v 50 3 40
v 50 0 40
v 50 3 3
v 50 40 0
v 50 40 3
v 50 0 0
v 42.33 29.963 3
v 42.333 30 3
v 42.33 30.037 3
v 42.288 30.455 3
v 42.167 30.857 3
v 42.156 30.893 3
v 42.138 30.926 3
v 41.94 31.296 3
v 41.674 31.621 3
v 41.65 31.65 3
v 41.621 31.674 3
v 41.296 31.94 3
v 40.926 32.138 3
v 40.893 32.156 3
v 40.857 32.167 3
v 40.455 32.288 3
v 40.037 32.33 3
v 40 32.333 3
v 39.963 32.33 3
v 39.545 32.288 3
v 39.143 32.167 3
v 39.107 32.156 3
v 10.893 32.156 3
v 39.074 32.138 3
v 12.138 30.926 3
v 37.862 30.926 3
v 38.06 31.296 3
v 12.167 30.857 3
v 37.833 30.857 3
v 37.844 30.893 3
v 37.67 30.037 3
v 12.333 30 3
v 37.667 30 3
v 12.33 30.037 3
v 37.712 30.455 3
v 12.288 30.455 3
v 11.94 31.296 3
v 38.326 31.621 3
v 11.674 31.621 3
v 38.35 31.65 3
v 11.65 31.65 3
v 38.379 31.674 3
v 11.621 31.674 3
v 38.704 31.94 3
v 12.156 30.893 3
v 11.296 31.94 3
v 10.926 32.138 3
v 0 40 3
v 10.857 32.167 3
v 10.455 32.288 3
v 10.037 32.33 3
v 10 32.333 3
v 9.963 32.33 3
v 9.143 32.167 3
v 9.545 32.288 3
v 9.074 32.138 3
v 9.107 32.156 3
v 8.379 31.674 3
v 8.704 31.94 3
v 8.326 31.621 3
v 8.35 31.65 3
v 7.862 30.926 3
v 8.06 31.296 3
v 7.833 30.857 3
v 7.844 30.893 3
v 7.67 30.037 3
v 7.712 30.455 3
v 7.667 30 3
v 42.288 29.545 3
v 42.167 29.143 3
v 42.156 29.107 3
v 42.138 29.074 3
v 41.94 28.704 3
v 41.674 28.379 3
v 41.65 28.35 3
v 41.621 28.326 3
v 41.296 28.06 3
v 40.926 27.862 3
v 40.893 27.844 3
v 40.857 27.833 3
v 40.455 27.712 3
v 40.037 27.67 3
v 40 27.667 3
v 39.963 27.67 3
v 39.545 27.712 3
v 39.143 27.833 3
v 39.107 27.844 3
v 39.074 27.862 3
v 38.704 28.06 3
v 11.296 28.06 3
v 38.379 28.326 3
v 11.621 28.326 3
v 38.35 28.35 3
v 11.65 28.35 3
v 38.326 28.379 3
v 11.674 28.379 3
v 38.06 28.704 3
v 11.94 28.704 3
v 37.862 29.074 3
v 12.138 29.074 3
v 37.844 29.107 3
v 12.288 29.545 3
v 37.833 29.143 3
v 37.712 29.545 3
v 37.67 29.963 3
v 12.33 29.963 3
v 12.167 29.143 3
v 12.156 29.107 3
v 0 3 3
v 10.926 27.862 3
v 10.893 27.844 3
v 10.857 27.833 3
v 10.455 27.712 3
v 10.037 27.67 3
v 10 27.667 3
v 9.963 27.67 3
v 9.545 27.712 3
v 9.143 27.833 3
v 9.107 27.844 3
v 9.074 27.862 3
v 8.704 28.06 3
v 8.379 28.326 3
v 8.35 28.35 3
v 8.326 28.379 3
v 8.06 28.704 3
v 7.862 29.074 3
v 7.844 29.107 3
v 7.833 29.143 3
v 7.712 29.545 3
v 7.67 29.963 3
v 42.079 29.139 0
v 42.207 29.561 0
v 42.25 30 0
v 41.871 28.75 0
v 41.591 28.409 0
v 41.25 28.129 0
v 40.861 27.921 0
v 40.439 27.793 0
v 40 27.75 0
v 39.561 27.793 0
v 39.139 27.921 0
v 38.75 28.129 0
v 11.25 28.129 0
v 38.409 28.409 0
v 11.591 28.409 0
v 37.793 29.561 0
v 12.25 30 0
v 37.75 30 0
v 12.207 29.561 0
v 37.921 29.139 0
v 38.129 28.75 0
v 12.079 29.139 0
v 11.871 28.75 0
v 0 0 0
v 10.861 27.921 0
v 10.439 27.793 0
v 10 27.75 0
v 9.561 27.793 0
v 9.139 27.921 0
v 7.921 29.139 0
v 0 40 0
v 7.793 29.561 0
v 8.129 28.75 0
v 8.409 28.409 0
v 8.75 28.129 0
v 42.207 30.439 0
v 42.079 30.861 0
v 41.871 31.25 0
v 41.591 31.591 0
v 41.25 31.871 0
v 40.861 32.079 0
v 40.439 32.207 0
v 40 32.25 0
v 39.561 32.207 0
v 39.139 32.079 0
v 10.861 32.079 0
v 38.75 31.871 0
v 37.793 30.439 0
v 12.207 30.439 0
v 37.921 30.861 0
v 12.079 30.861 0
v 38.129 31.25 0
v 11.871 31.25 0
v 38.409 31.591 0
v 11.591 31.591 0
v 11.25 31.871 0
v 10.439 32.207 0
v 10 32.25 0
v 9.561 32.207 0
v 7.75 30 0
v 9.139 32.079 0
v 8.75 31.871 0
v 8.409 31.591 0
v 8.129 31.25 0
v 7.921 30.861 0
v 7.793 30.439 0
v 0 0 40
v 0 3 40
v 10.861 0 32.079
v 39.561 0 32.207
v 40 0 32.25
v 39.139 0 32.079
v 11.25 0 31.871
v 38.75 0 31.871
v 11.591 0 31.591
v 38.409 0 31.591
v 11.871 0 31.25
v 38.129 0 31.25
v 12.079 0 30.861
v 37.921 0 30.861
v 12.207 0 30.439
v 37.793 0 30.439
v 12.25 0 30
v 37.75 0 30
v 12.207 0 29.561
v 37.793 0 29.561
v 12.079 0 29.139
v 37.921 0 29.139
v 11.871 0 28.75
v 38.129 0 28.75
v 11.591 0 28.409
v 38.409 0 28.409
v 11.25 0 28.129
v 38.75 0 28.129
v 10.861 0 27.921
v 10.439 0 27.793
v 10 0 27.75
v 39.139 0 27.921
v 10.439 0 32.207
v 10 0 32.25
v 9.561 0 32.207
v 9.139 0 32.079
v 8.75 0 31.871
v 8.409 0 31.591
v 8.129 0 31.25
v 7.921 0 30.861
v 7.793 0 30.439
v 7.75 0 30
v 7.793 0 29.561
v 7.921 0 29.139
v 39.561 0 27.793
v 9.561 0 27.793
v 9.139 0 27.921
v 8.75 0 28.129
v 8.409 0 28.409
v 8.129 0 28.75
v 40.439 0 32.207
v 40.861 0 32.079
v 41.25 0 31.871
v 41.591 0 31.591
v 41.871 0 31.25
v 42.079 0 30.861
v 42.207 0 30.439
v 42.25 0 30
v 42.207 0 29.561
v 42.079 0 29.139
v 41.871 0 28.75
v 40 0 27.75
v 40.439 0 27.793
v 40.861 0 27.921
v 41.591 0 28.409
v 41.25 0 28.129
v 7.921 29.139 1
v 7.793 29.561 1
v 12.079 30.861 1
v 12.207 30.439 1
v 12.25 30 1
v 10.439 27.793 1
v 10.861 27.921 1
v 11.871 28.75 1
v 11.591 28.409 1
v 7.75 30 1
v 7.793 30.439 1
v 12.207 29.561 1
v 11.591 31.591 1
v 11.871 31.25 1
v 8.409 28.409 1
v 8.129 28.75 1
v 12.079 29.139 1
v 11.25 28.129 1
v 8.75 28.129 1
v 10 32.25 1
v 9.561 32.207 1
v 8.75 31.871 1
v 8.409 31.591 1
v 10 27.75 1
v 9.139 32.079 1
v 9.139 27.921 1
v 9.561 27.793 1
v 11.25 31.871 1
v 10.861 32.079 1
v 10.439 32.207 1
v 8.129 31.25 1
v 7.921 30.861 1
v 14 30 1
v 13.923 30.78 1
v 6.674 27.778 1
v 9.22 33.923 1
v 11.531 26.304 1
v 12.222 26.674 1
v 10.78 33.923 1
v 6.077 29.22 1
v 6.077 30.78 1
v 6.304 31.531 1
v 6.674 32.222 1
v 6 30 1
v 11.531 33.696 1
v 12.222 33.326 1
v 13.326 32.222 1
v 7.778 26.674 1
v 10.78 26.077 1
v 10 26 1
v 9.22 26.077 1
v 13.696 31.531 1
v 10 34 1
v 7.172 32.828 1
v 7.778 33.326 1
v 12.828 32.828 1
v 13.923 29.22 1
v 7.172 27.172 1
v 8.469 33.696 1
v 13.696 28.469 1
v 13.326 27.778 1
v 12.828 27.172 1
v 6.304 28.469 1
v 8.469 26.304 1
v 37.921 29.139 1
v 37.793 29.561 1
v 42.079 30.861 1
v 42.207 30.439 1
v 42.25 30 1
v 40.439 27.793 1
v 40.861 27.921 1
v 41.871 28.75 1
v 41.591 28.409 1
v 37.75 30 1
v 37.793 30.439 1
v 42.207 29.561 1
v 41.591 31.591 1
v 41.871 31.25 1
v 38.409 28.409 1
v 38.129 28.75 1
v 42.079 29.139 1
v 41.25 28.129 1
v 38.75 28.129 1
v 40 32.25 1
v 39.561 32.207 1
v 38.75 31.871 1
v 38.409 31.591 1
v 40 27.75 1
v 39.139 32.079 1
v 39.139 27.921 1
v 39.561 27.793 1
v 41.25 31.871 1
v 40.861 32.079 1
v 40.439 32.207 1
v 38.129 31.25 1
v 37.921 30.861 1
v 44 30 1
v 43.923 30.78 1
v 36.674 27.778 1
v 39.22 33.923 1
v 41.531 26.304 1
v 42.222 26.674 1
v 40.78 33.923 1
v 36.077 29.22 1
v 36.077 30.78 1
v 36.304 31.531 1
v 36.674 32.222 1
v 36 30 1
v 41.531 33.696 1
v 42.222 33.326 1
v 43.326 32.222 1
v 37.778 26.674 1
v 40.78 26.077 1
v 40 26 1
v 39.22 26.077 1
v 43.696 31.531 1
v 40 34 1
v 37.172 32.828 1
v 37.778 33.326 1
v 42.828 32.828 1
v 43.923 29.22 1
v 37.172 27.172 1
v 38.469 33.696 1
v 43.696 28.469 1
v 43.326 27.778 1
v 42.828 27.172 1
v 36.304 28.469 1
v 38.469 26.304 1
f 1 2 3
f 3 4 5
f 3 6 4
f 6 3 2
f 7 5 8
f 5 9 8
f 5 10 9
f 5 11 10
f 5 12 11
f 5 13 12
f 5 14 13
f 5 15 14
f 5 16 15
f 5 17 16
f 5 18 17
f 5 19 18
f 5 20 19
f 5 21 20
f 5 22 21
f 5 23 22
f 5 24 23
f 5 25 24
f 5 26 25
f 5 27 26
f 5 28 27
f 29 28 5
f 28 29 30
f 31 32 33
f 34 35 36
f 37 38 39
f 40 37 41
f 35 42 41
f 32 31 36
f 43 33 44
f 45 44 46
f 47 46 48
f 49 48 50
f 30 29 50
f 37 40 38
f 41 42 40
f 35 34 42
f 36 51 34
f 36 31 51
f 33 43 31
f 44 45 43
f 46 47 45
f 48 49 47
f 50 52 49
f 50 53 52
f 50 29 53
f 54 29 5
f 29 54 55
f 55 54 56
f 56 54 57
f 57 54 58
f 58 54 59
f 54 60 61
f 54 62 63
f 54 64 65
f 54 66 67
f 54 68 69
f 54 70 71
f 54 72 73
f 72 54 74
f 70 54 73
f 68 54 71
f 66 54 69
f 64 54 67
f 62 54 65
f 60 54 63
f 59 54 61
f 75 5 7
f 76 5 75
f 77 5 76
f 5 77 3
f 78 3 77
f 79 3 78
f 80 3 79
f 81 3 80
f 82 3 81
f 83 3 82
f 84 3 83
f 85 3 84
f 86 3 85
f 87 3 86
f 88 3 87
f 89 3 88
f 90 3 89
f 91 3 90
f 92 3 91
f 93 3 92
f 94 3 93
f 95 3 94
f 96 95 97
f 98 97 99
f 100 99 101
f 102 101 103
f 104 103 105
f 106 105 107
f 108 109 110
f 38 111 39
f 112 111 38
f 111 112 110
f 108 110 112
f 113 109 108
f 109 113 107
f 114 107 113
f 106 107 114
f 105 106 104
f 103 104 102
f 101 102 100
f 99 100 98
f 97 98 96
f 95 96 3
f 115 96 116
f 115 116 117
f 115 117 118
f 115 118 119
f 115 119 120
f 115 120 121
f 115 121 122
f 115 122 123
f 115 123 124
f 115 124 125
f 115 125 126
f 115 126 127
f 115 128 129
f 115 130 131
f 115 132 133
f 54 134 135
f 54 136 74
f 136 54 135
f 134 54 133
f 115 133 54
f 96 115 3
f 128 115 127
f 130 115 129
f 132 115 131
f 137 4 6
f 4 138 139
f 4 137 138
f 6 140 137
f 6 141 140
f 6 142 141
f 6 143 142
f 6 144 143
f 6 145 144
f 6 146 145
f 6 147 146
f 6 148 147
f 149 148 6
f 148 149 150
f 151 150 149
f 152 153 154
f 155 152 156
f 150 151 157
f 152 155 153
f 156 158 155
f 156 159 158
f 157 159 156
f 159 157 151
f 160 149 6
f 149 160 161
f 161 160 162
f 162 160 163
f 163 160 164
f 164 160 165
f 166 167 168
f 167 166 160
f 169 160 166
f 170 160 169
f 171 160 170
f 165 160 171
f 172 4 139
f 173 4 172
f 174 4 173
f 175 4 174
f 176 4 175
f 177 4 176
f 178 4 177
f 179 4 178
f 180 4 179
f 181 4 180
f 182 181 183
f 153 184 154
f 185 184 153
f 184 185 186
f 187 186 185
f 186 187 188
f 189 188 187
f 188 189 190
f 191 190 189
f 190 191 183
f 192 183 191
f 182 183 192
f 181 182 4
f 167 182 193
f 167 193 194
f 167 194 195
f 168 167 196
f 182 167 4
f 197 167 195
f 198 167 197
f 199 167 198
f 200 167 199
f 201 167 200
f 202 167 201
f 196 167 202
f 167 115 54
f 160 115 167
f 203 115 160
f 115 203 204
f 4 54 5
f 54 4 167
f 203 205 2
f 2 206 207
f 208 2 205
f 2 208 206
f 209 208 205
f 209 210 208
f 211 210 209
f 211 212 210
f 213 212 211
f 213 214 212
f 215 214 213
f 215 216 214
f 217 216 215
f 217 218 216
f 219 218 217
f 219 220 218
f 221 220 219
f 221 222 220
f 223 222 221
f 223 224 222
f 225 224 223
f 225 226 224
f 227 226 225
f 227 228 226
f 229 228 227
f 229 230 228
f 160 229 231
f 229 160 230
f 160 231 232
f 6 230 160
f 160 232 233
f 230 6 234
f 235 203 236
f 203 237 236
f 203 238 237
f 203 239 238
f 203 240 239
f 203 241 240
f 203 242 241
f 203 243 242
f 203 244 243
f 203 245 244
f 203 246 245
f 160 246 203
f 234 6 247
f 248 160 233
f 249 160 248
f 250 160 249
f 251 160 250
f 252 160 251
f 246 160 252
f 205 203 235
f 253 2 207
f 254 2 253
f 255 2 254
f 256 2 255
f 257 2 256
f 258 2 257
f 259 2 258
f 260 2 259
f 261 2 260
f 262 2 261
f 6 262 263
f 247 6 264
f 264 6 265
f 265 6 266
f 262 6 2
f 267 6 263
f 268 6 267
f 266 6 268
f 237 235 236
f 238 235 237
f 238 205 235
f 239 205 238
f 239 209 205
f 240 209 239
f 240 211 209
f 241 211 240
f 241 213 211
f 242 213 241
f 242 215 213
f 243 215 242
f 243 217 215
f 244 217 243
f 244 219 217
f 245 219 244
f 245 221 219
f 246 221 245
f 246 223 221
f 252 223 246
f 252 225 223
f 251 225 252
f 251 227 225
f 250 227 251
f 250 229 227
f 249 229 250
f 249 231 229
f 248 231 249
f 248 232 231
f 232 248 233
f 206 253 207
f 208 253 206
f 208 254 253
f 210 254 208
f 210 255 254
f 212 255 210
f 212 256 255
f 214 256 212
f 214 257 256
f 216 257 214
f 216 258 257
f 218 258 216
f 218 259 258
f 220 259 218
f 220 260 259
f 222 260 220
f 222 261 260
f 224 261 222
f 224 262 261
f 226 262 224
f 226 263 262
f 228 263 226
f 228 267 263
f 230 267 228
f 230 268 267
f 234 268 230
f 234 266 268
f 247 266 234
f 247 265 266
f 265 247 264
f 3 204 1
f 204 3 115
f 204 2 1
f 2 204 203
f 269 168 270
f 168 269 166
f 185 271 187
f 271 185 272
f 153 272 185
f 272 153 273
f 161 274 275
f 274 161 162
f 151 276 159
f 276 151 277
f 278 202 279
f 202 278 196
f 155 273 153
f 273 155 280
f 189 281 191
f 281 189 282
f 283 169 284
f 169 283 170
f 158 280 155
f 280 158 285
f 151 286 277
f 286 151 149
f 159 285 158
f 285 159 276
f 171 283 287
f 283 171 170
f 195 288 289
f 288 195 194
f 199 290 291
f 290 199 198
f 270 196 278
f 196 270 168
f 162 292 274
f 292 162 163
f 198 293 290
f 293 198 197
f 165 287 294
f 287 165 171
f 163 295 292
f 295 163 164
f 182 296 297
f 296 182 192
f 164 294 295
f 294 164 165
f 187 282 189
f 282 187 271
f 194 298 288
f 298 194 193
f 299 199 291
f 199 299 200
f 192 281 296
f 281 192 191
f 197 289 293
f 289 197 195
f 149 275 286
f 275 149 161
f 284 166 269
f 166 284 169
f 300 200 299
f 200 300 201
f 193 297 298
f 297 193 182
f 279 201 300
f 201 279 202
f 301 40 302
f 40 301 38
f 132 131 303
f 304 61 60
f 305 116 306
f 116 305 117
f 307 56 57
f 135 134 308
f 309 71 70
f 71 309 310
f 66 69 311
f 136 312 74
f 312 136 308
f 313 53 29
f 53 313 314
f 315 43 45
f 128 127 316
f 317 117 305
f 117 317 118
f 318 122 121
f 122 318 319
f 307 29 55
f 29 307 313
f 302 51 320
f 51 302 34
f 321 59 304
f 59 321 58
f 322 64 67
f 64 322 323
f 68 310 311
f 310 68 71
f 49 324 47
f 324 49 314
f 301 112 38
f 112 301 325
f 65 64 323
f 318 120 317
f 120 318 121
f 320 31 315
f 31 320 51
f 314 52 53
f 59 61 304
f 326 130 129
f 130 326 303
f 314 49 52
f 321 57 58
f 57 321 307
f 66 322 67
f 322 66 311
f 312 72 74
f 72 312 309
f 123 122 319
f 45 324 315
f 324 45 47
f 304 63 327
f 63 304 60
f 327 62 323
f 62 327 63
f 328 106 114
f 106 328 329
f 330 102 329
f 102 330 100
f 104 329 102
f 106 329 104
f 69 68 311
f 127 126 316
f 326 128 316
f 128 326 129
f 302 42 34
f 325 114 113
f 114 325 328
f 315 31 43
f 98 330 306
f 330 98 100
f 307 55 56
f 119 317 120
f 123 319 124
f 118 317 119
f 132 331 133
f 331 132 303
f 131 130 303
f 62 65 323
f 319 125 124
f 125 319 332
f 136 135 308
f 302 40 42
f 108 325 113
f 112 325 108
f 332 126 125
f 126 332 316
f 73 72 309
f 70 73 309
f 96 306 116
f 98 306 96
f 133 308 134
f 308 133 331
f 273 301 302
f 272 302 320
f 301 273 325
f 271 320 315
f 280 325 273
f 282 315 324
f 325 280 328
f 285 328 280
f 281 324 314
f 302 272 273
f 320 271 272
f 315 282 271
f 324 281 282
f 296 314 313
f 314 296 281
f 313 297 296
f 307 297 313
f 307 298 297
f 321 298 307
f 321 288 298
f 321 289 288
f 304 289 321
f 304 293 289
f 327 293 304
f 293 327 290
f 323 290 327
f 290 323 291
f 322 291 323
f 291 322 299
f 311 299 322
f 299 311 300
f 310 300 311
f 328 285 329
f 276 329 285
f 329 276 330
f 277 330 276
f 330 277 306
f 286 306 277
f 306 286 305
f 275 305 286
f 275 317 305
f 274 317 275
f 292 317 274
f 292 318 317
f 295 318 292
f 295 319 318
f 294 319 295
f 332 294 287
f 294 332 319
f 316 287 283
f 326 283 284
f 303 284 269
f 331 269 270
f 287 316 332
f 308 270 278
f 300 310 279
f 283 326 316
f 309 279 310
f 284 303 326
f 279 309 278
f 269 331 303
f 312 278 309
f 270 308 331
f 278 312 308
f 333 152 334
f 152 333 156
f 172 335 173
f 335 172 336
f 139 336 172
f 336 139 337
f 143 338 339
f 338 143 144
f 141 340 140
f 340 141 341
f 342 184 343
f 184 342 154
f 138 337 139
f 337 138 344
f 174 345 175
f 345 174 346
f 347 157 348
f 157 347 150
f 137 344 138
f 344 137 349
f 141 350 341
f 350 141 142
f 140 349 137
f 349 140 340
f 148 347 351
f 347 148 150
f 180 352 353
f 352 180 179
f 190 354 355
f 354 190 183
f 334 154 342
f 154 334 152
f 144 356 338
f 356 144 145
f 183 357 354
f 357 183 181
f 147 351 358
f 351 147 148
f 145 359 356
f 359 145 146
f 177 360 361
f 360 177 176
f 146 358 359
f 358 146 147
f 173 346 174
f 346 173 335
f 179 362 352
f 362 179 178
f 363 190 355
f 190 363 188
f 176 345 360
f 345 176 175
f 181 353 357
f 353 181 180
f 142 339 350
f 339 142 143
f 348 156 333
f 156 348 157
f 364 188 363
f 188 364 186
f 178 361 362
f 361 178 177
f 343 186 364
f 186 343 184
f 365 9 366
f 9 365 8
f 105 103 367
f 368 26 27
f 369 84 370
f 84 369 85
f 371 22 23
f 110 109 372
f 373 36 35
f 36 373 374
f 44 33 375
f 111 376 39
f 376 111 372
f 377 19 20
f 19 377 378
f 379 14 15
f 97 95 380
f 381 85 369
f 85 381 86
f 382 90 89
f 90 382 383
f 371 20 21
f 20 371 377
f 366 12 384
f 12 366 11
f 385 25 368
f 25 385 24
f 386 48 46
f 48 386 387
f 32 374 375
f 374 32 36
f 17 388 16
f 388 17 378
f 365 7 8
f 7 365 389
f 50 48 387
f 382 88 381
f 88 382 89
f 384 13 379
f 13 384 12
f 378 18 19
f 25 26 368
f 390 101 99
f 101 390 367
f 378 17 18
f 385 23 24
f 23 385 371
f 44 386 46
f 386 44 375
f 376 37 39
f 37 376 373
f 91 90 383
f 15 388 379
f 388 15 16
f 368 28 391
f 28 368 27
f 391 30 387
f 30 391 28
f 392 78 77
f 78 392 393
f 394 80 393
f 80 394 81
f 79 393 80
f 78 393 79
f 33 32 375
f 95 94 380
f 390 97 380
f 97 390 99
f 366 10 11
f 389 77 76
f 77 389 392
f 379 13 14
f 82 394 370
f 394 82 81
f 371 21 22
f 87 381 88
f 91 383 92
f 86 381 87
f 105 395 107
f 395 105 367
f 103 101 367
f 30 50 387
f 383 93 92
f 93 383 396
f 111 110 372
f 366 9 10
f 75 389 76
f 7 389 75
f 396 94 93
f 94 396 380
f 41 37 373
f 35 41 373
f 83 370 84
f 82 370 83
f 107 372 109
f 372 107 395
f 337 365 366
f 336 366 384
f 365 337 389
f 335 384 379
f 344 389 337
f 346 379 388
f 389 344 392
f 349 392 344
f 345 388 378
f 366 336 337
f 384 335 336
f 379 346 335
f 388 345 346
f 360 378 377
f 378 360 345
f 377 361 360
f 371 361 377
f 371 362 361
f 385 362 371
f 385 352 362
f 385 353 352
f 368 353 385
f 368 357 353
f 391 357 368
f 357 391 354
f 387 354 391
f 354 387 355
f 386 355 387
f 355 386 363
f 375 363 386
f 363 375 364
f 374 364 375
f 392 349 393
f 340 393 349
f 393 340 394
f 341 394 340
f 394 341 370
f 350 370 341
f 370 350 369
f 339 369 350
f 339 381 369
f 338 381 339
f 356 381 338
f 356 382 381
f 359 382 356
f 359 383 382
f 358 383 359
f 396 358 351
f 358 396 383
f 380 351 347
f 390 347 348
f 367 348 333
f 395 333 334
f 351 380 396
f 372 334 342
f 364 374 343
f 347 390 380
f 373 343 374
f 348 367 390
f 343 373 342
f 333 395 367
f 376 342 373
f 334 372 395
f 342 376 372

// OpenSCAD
// L字金具の寸法
flange_width = 50;  // 幅 (X方向)
horizontal_flange_depth = 40; // 水平フランジの奥行き (Y方向)
vertical_flange_height = 40;  // 垂直フランジの高さ (Z方向)
thickness = 3;      // 板厚

// 皿穴の寸法 (M4用)
hole_diameter = 4.5;    // 貫通穴の直径
countersink_diameter = 8; // 皿座面の直径
countersink_depth = 2;  // 皿座面の深さ

// 皿穴の位置 (各面の縁から10mm内側)
hole_offset_from_edge = 10;
hole_spacing_x = flange_width - (2 * hole_offset_from_edge); // 左右の穴の間隔
hole_pos_x = flange_width / 2; // X軸の中心

module L_bracket() {
    // 水平フランジ
    cube([flange_width, horizontal_flange_depth, thickness]);

    // 垂直フランジ
    translate([0, thickness, 0]) {
        rotate([90, 0, 0]) {
            cube([flange_width, vertical_flange_height, thickness]);
        }
    }
}

module countersunk_hole() {
    cylinder(h = thickness + 0.1, d = hole_diameter, $fn = 32);
    translate([0, 0, thickness - countersink_depth]) {
        cylinder(h = countersink_depth + 0.1, d1 = countersink_diameter, d2 = hole_diameter, $fn = 32);
    }
}

difference() {
    L_bracket();

    // 水平フランジの皿穴
    for (i = [-1, 1]) {
        translate([hole_pos_x + i * (hole_spacing_x / 2),
                   horizontal_flange_depth - hole_offset_from_edge,
                   0]) {
            countersunk_hole();
        }
    }

    // 垂直フランジの皿穴
    for (i = [-1, 1]) {
        translate([hole_pos_x + i * (hole_spacing_x / 2),
                   0, // Y方向は厚み分ずらす
                   vertical_flange_height - hole_offset_from_edge]) {
            rotate([90, 0, 0]) { // 皿座面が外側を向くように回転
                countersunk_hole();
            }
        }
    }
}
